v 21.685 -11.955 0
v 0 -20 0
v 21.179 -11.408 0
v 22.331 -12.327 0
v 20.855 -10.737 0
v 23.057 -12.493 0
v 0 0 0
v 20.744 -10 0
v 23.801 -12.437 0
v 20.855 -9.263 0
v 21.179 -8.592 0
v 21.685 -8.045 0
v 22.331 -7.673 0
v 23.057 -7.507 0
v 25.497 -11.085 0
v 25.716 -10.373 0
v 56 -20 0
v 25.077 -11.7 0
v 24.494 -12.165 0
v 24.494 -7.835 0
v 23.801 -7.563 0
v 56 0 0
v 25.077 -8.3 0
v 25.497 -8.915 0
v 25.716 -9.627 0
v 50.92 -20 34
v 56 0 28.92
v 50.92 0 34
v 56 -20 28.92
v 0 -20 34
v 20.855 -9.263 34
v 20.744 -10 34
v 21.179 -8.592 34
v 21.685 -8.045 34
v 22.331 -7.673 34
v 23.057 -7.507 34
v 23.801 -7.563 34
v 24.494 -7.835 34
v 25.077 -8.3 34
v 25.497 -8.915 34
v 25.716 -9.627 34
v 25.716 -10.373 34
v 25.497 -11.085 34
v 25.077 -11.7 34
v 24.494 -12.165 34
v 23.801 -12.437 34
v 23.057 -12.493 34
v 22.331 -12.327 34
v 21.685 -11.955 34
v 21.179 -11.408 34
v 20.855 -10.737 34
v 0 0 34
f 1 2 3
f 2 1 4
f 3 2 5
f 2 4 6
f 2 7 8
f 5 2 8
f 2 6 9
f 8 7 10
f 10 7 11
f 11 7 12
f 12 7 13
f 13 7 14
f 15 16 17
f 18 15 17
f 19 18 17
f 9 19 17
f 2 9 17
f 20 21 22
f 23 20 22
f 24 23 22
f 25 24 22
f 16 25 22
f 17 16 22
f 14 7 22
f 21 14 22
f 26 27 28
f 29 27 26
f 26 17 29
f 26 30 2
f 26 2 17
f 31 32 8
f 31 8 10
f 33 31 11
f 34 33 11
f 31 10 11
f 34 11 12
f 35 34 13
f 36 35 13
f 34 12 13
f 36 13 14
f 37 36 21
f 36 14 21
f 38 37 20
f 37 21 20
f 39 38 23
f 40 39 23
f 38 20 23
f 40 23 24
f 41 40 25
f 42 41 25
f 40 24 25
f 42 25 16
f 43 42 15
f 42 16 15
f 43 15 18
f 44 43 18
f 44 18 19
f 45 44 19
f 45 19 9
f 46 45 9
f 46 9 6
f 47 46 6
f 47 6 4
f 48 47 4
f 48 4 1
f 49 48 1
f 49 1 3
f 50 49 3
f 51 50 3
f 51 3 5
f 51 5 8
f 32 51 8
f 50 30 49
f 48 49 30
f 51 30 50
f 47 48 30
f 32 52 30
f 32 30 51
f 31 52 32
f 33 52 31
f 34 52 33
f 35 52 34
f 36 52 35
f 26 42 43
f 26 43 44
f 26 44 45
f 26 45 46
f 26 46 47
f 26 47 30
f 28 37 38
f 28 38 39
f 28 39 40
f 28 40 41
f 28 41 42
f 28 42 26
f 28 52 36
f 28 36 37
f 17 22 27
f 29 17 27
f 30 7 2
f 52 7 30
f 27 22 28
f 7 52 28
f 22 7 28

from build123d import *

# Parameters (mm, degrees)
F0_W     = 56
F0_H     = 34
F1_DEPTH = 20
F3_D     = 5
F4_SIZE  = 5.08


with BuildPart() as f1:
    # F0 (on Front) → F1 (new body)
    with BuildSketch(Plane.XZ):
        with Locations((28, 17)):
            Rectangle(F0_W, F0_H)
    extrude(amount=F1_DEPTH)

    # F3 (through all)
    with Locations(Plane.XY.offset(34)):
        with Locations((23.244202, -10)):
            Hole(F3_D / 2)

    # F4
    f4_edges = [f1.edges().sort_by_distance(p)[0] for p in [
        (56, -10, 34),
    ]]
    chamfer(f4_edges, length=F4_SIZE)


solid = f1.part
